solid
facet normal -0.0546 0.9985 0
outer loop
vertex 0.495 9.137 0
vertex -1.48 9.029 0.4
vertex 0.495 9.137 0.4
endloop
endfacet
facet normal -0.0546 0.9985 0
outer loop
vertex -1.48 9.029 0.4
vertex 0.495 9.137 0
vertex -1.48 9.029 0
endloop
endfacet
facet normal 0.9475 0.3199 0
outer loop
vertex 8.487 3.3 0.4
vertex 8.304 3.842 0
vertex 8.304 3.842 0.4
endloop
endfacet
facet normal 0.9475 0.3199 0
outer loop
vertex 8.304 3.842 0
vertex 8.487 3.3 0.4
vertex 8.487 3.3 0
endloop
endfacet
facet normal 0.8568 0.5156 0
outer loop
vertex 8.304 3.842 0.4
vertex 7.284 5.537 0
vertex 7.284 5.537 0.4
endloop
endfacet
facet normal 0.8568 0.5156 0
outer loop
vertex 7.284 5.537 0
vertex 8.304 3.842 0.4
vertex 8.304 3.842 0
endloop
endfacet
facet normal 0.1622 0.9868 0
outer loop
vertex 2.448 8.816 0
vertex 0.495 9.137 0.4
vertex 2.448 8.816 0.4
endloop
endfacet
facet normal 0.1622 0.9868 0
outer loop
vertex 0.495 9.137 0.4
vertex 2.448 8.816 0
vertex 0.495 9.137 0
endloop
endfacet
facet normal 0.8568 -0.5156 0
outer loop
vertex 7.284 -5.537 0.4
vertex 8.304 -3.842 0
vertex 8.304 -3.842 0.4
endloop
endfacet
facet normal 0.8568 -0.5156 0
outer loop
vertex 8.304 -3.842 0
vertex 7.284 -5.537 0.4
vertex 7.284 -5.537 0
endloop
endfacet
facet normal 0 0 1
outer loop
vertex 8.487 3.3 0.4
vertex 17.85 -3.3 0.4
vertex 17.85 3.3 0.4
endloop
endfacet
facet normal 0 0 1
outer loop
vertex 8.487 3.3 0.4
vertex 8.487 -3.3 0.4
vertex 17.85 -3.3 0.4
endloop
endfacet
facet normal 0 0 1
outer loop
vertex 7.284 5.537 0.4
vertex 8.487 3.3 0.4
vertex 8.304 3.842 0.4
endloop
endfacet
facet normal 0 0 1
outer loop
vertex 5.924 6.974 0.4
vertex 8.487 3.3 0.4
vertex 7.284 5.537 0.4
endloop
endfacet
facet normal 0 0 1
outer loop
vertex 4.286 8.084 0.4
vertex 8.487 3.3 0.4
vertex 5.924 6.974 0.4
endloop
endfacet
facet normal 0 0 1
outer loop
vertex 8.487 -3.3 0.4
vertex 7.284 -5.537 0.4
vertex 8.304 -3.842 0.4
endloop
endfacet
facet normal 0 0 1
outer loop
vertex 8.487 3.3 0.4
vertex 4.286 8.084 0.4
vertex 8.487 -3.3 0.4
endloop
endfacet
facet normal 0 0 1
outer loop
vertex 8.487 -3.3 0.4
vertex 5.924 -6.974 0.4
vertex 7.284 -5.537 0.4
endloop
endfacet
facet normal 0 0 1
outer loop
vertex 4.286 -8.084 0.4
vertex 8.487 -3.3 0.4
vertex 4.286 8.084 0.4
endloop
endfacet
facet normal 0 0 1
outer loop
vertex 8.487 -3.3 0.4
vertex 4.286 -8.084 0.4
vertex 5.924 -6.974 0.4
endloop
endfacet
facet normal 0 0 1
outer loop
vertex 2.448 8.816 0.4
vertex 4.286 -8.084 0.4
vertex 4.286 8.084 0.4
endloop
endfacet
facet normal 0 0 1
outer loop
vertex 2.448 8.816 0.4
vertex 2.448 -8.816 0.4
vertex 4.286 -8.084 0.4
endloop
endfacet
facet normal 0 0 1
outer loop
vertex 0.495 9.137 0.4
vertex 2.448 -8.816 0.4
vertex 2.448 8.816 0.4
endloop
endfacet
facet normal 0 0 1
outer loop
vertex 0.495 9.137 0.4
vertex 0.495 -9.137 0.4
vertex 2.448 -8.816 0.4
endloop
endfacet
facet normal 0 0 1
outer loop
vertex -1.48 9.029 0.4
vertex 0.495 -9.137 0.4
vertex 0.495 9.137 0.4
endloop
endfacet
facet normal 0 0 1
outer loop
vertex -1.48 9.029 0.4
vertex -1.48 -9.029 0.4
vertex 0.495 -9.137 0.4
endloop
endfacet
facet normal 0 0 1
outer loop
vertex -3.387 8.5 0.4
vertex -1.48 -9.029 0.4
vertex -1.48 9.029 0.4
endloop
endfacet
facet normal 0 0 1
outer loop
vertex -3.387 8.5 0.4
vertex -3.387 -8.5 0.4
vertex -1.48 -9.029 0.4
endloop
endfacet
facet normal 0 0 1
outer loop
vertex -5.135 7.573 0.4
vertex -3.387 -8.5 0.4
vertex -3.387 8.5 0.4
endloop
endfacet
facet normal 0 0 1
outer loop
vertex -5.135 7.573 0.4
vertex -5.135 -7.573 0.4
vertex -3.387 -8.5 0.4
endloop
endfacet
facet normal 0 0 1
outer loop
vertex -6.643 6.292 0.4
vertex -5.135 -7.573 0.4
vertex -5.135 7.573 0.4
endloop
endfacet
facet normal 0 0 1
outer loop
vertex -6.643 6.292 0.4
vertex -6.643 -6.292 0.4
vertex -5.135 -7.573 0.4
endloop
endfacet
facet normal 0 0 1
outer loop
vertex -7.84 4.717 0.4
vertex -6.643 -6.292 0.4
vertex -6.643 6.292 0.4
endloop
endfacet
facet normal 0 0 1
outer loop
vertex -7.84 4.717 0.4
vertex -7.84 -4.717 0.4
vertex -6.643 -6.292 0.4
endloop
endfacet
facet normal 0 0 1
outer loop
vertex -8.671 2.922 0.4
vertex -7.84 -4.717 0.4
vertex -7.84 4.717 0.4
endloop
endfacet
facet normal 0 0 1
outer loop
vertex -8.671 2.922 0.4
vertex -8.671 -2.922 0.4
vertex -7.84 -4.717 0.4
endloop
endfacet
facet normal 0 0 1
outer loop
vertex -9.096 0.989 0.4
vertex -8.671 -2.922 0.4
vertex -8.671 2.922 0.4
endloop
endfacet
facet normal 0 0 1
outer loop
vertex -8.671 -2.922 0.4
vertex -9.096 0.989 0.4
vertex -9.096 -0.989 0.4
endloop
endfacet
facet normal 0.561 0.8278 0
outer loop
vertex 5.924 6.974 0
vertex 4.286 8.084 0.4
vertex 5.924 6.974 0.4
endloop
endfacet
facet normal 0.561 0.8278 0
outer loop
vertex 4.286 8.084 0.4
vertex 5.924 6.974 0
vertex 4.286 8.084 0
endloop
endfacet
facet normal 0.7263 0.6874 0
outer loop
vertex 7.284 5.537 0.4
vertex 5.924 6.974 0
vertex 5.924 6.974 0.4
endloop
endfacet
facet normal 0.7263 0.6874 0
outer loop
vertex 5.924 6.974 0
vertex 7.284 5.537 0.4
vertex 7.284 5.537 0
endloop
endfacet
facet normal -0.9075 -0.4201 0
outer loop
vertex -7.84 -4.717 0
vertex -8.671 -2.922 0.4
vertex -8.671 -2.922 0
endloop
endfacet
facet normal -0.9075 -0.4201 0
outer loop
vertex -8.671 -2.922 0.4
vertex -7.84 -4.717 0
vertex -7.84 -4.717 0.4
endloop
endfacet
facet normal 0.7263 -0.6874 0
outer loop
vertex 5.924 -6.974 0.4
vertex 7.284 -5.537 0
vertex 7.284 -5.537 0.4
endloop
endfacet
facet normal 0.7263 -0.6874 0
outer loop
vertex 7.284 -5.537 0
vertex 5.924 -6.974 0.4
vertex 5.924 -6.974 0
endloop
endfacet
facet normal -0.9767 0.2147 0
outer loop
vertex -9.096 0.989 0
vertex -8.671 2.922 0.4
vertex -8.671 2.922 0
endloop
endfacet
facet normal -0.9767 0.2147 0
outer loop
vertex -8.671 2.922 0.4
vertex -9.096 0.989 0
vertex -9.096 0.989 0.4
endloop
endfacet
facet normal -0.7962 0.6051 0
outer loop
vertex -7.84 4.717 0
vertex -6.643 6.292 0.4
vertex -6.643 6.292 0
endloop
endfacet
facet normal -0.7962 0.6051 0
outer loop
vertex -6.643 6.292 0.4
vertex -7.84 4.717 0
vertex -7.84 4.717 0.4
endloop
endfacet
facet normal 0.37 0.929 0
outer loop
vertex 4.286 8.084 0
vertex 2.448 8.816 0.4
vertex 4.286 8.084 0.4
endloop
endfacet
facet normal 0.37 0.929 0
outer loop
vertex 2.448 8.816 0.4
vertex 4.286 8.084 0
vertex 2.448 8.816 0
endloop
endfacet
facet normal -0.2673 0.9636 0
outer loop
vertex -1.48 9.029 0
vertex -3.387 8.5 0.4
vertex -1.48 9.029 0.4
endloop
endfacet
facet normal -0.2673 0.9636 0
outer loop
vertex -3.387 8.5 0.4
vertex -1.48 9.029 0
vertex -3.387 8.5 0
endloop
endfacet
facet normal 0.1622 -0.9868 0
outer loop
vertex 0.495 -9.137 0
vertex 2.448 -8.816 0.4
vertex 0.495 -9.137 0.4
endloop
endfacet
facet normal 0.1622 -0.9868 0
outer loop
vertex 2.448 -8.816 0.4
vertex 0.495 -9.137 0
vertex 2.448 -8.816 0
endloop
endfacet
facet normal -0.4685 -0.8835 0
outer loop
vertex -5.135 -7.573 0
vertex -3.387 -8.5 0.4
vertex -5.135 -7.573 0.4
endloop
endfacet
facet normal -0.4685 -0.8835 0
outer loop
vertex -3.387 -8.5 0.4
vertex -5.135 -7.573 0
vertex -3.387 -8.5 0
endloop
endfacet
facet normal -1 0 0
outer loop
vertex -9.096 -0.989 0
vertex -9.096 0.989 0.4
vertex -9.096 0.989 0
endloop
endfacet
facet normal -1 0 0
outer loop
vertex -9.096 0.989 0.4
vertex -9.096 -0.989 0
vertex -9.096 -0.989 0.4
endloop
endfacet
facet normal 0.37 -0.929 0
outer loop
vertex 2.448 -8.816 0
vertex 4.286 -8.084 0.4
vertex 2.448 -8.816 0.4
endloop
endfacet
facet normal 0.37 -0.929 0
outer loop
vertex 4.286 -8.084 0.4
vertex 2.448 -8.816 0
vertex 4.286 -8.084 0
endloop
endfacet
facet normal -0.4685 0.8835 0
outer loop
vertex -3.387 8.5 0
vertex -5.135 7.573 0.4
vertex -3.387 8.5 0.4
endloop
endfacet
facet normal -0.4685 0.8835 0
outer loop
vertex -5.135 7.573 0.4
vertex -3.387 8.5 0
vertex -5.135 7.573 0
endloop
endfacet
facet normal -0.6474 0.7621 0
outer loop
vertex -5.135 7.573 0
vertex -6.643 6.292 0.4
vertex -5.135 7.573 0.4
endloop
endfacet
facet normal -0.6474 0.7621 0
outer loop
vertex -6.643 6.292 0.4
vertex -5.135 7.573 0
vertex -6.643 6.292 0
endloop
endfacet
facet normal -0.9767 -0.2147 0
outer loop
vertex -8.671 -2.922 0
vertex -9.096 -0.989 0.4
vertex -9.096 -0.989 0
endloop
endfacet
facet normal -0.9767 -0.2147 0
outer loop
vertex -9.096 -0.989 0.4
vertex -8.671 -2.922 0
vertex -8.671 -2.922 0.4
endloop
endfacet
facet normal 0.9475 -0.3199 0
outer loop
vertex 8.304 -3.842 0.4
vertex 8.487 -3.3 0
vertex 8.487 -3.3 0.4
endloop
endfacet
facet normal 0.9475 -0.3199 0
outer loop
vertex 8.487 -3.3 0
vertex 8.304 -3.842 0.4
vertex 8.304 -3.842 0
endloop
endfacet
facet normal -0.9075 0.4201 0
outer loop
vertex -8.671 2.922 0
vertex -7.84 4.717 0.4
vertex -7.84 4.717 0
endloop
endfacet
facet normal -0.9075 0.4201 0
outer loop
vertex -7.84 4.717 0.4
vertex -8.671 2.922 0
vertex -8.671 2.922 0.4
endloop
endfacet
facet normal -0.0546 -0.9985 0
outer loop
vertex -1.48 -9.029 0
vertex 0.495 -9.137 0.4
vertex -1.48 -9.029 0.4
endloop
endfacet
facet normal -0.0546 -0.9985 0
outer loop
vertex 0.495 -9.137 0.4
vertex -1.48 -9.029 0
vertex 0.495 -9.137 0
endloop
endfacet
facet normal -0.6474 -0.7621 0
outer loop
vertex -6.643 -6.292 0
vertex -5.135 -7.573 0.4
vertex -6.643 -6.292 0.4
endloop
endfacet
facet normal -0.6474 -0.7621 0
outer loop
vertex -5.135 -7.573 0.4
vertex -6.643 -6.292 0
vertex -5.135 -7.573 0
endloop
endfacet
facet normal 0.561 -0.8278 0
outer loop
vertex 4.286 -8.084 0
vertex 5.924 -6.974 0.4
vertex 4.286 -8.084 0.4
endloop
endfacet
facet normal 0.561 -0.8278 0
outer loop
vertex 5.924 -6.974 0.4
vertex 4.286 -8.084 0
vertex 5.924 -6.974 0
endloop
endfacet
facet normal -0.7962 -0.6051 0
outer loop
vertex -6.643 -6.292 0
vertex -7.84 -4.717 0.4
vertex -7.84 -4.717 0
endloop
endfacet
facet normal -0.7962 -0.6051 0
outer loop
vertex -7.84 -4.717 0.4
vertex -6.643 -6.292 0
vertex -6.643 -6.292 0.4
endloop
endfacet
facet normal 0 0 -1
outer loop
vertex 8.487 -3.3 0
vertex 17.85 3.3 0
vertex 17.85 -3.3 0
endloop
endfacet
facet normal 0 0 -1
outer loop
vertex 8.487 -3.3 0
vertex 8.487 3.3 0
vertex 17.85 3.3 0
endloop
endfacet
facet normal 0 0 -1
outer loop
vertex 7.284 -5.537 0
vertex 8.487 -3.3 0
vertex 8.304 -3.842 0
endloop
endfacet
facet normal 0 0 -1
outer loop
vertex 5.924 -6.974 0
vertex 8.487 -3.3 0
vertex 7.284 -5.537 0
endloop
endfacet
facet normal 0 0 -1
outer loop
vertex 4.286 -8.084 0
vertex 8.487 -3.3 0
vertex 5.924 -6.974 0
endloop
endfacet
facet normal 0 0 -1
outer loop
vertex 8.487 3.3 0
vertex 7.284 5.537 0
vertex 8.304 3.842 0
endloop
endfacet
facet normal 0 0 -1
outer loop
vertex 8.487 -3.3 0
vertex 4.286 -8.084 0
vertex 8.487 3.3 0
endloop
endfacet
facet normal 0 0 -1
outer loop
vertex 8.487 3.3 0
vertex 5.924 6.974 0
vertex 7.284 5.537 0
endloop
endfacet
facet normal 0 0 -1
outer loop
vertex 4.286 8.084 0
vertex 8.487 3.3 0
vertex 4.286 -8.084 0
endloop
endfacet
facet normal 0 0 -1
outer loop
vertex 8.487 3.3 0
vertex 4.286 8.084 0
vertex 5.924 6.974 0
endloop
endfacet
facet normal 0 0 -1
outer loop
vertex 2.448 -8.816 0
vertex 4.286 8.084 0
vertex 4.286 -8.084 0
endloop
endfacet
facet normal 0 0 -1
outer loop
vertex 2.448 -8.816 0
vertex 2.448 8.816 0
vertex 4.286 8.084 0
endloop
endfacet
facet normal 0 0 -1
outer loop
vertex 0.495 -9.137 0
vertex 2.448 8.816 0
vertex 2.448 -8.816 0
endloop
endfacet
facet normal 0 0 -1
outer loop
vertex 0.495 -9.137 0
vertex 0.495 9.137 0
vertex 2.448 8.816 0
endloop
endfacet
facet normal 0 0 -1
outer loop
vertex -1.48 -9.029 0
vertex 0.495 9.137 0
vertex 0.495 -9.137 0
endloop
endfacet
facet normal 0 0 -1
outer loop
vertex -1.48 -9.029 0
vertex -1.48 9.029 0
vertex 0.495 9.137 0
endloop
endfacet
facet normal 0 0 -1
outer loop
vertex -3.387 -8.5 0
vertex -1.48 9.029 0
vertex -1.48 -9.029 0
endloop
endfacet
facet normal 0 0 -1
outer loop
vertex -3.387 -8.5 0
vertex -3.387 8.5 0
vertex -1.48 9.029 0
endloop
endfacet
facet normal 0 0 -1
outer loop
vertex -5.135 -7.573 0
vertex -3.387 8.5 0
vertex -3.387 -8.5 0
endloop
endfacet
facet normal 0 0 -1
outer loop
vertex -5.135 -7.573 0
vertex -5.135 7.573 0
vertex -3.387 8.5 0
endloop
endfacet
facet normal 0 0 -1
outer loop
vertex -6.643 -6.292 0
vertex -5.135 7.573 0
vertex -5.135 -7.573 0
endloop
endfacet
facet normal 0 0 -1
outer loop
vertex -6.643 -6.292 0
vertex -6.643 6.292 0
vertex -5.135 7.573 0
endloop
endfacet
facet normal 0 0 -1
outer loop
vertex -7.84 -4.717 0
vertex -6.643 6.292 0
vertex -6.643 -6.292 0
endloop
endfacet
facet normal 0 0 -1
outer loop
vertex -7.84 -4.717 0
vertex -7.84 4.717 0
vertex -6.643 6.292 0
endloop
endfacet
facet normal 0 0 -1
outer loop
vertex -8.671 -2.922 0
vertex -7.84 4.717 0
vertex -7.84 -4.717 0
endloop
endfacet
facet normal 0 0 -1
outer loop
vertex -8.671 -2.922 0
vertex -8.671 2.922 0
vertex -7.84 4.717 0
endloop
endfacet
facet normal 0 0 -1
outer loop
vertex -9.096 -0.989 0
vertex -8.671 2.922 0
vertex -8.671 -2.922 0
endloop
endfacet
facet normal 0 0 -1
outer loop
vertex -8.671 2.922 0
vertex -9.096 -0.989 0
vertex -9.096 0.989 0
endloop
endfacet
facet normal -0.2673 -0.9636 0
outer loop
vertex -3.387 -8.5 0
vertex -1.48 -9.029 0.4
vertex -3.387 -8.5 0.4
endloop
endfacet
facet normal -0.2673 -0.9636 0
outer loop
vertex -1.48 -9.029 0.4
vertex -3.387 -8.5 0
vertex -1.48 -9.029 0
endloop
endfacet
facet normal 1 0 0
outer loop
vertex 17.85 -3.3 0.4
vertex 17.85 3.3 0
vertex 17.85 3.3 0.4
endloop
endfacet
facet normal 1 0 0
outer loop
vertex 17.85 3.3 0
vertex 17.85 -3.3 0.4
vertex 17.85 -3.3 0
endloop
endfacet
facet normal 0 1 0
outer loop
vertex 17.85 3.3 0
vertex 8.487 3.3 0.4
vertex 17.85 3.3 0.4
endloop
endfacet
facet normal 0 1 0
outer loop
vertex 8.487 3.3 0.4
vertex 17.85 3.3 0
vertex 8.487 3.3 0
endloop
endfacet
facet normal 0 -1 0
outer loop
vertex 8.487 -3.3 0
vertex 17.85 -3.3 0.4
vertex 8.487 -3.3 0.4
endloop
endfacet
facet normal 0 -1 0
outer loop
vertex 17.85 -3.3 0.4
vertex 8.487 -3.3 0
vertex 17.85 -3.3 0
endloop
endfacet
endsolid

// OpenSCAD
function create_sensor_dims(sensor_OD=18.3, sensor_thick=0.4, tab_length=27-18.3/2, tab_width=6.6) = [sensor_OD, sensor_thick, tab_length, tab_width];

module pressure_sensor(sensor_dims) {

    sensor_OD = sensor_dims[0];
    sensor_thick = sensor_dims[1];
    tab_length = sensor_dims[2];
    tab_width = sensor_dims[3];

    color("red")
    union() {
        cylinder(d=sensor_OD, h=sensor_thick);
        translate([0, -tab_width/2, 0])
        cube([tab_length, tab_width, sensor_thick]);
    }
}

sensor_dims = create_sensor_dims();
pressure_sensor(sensor_dims);
